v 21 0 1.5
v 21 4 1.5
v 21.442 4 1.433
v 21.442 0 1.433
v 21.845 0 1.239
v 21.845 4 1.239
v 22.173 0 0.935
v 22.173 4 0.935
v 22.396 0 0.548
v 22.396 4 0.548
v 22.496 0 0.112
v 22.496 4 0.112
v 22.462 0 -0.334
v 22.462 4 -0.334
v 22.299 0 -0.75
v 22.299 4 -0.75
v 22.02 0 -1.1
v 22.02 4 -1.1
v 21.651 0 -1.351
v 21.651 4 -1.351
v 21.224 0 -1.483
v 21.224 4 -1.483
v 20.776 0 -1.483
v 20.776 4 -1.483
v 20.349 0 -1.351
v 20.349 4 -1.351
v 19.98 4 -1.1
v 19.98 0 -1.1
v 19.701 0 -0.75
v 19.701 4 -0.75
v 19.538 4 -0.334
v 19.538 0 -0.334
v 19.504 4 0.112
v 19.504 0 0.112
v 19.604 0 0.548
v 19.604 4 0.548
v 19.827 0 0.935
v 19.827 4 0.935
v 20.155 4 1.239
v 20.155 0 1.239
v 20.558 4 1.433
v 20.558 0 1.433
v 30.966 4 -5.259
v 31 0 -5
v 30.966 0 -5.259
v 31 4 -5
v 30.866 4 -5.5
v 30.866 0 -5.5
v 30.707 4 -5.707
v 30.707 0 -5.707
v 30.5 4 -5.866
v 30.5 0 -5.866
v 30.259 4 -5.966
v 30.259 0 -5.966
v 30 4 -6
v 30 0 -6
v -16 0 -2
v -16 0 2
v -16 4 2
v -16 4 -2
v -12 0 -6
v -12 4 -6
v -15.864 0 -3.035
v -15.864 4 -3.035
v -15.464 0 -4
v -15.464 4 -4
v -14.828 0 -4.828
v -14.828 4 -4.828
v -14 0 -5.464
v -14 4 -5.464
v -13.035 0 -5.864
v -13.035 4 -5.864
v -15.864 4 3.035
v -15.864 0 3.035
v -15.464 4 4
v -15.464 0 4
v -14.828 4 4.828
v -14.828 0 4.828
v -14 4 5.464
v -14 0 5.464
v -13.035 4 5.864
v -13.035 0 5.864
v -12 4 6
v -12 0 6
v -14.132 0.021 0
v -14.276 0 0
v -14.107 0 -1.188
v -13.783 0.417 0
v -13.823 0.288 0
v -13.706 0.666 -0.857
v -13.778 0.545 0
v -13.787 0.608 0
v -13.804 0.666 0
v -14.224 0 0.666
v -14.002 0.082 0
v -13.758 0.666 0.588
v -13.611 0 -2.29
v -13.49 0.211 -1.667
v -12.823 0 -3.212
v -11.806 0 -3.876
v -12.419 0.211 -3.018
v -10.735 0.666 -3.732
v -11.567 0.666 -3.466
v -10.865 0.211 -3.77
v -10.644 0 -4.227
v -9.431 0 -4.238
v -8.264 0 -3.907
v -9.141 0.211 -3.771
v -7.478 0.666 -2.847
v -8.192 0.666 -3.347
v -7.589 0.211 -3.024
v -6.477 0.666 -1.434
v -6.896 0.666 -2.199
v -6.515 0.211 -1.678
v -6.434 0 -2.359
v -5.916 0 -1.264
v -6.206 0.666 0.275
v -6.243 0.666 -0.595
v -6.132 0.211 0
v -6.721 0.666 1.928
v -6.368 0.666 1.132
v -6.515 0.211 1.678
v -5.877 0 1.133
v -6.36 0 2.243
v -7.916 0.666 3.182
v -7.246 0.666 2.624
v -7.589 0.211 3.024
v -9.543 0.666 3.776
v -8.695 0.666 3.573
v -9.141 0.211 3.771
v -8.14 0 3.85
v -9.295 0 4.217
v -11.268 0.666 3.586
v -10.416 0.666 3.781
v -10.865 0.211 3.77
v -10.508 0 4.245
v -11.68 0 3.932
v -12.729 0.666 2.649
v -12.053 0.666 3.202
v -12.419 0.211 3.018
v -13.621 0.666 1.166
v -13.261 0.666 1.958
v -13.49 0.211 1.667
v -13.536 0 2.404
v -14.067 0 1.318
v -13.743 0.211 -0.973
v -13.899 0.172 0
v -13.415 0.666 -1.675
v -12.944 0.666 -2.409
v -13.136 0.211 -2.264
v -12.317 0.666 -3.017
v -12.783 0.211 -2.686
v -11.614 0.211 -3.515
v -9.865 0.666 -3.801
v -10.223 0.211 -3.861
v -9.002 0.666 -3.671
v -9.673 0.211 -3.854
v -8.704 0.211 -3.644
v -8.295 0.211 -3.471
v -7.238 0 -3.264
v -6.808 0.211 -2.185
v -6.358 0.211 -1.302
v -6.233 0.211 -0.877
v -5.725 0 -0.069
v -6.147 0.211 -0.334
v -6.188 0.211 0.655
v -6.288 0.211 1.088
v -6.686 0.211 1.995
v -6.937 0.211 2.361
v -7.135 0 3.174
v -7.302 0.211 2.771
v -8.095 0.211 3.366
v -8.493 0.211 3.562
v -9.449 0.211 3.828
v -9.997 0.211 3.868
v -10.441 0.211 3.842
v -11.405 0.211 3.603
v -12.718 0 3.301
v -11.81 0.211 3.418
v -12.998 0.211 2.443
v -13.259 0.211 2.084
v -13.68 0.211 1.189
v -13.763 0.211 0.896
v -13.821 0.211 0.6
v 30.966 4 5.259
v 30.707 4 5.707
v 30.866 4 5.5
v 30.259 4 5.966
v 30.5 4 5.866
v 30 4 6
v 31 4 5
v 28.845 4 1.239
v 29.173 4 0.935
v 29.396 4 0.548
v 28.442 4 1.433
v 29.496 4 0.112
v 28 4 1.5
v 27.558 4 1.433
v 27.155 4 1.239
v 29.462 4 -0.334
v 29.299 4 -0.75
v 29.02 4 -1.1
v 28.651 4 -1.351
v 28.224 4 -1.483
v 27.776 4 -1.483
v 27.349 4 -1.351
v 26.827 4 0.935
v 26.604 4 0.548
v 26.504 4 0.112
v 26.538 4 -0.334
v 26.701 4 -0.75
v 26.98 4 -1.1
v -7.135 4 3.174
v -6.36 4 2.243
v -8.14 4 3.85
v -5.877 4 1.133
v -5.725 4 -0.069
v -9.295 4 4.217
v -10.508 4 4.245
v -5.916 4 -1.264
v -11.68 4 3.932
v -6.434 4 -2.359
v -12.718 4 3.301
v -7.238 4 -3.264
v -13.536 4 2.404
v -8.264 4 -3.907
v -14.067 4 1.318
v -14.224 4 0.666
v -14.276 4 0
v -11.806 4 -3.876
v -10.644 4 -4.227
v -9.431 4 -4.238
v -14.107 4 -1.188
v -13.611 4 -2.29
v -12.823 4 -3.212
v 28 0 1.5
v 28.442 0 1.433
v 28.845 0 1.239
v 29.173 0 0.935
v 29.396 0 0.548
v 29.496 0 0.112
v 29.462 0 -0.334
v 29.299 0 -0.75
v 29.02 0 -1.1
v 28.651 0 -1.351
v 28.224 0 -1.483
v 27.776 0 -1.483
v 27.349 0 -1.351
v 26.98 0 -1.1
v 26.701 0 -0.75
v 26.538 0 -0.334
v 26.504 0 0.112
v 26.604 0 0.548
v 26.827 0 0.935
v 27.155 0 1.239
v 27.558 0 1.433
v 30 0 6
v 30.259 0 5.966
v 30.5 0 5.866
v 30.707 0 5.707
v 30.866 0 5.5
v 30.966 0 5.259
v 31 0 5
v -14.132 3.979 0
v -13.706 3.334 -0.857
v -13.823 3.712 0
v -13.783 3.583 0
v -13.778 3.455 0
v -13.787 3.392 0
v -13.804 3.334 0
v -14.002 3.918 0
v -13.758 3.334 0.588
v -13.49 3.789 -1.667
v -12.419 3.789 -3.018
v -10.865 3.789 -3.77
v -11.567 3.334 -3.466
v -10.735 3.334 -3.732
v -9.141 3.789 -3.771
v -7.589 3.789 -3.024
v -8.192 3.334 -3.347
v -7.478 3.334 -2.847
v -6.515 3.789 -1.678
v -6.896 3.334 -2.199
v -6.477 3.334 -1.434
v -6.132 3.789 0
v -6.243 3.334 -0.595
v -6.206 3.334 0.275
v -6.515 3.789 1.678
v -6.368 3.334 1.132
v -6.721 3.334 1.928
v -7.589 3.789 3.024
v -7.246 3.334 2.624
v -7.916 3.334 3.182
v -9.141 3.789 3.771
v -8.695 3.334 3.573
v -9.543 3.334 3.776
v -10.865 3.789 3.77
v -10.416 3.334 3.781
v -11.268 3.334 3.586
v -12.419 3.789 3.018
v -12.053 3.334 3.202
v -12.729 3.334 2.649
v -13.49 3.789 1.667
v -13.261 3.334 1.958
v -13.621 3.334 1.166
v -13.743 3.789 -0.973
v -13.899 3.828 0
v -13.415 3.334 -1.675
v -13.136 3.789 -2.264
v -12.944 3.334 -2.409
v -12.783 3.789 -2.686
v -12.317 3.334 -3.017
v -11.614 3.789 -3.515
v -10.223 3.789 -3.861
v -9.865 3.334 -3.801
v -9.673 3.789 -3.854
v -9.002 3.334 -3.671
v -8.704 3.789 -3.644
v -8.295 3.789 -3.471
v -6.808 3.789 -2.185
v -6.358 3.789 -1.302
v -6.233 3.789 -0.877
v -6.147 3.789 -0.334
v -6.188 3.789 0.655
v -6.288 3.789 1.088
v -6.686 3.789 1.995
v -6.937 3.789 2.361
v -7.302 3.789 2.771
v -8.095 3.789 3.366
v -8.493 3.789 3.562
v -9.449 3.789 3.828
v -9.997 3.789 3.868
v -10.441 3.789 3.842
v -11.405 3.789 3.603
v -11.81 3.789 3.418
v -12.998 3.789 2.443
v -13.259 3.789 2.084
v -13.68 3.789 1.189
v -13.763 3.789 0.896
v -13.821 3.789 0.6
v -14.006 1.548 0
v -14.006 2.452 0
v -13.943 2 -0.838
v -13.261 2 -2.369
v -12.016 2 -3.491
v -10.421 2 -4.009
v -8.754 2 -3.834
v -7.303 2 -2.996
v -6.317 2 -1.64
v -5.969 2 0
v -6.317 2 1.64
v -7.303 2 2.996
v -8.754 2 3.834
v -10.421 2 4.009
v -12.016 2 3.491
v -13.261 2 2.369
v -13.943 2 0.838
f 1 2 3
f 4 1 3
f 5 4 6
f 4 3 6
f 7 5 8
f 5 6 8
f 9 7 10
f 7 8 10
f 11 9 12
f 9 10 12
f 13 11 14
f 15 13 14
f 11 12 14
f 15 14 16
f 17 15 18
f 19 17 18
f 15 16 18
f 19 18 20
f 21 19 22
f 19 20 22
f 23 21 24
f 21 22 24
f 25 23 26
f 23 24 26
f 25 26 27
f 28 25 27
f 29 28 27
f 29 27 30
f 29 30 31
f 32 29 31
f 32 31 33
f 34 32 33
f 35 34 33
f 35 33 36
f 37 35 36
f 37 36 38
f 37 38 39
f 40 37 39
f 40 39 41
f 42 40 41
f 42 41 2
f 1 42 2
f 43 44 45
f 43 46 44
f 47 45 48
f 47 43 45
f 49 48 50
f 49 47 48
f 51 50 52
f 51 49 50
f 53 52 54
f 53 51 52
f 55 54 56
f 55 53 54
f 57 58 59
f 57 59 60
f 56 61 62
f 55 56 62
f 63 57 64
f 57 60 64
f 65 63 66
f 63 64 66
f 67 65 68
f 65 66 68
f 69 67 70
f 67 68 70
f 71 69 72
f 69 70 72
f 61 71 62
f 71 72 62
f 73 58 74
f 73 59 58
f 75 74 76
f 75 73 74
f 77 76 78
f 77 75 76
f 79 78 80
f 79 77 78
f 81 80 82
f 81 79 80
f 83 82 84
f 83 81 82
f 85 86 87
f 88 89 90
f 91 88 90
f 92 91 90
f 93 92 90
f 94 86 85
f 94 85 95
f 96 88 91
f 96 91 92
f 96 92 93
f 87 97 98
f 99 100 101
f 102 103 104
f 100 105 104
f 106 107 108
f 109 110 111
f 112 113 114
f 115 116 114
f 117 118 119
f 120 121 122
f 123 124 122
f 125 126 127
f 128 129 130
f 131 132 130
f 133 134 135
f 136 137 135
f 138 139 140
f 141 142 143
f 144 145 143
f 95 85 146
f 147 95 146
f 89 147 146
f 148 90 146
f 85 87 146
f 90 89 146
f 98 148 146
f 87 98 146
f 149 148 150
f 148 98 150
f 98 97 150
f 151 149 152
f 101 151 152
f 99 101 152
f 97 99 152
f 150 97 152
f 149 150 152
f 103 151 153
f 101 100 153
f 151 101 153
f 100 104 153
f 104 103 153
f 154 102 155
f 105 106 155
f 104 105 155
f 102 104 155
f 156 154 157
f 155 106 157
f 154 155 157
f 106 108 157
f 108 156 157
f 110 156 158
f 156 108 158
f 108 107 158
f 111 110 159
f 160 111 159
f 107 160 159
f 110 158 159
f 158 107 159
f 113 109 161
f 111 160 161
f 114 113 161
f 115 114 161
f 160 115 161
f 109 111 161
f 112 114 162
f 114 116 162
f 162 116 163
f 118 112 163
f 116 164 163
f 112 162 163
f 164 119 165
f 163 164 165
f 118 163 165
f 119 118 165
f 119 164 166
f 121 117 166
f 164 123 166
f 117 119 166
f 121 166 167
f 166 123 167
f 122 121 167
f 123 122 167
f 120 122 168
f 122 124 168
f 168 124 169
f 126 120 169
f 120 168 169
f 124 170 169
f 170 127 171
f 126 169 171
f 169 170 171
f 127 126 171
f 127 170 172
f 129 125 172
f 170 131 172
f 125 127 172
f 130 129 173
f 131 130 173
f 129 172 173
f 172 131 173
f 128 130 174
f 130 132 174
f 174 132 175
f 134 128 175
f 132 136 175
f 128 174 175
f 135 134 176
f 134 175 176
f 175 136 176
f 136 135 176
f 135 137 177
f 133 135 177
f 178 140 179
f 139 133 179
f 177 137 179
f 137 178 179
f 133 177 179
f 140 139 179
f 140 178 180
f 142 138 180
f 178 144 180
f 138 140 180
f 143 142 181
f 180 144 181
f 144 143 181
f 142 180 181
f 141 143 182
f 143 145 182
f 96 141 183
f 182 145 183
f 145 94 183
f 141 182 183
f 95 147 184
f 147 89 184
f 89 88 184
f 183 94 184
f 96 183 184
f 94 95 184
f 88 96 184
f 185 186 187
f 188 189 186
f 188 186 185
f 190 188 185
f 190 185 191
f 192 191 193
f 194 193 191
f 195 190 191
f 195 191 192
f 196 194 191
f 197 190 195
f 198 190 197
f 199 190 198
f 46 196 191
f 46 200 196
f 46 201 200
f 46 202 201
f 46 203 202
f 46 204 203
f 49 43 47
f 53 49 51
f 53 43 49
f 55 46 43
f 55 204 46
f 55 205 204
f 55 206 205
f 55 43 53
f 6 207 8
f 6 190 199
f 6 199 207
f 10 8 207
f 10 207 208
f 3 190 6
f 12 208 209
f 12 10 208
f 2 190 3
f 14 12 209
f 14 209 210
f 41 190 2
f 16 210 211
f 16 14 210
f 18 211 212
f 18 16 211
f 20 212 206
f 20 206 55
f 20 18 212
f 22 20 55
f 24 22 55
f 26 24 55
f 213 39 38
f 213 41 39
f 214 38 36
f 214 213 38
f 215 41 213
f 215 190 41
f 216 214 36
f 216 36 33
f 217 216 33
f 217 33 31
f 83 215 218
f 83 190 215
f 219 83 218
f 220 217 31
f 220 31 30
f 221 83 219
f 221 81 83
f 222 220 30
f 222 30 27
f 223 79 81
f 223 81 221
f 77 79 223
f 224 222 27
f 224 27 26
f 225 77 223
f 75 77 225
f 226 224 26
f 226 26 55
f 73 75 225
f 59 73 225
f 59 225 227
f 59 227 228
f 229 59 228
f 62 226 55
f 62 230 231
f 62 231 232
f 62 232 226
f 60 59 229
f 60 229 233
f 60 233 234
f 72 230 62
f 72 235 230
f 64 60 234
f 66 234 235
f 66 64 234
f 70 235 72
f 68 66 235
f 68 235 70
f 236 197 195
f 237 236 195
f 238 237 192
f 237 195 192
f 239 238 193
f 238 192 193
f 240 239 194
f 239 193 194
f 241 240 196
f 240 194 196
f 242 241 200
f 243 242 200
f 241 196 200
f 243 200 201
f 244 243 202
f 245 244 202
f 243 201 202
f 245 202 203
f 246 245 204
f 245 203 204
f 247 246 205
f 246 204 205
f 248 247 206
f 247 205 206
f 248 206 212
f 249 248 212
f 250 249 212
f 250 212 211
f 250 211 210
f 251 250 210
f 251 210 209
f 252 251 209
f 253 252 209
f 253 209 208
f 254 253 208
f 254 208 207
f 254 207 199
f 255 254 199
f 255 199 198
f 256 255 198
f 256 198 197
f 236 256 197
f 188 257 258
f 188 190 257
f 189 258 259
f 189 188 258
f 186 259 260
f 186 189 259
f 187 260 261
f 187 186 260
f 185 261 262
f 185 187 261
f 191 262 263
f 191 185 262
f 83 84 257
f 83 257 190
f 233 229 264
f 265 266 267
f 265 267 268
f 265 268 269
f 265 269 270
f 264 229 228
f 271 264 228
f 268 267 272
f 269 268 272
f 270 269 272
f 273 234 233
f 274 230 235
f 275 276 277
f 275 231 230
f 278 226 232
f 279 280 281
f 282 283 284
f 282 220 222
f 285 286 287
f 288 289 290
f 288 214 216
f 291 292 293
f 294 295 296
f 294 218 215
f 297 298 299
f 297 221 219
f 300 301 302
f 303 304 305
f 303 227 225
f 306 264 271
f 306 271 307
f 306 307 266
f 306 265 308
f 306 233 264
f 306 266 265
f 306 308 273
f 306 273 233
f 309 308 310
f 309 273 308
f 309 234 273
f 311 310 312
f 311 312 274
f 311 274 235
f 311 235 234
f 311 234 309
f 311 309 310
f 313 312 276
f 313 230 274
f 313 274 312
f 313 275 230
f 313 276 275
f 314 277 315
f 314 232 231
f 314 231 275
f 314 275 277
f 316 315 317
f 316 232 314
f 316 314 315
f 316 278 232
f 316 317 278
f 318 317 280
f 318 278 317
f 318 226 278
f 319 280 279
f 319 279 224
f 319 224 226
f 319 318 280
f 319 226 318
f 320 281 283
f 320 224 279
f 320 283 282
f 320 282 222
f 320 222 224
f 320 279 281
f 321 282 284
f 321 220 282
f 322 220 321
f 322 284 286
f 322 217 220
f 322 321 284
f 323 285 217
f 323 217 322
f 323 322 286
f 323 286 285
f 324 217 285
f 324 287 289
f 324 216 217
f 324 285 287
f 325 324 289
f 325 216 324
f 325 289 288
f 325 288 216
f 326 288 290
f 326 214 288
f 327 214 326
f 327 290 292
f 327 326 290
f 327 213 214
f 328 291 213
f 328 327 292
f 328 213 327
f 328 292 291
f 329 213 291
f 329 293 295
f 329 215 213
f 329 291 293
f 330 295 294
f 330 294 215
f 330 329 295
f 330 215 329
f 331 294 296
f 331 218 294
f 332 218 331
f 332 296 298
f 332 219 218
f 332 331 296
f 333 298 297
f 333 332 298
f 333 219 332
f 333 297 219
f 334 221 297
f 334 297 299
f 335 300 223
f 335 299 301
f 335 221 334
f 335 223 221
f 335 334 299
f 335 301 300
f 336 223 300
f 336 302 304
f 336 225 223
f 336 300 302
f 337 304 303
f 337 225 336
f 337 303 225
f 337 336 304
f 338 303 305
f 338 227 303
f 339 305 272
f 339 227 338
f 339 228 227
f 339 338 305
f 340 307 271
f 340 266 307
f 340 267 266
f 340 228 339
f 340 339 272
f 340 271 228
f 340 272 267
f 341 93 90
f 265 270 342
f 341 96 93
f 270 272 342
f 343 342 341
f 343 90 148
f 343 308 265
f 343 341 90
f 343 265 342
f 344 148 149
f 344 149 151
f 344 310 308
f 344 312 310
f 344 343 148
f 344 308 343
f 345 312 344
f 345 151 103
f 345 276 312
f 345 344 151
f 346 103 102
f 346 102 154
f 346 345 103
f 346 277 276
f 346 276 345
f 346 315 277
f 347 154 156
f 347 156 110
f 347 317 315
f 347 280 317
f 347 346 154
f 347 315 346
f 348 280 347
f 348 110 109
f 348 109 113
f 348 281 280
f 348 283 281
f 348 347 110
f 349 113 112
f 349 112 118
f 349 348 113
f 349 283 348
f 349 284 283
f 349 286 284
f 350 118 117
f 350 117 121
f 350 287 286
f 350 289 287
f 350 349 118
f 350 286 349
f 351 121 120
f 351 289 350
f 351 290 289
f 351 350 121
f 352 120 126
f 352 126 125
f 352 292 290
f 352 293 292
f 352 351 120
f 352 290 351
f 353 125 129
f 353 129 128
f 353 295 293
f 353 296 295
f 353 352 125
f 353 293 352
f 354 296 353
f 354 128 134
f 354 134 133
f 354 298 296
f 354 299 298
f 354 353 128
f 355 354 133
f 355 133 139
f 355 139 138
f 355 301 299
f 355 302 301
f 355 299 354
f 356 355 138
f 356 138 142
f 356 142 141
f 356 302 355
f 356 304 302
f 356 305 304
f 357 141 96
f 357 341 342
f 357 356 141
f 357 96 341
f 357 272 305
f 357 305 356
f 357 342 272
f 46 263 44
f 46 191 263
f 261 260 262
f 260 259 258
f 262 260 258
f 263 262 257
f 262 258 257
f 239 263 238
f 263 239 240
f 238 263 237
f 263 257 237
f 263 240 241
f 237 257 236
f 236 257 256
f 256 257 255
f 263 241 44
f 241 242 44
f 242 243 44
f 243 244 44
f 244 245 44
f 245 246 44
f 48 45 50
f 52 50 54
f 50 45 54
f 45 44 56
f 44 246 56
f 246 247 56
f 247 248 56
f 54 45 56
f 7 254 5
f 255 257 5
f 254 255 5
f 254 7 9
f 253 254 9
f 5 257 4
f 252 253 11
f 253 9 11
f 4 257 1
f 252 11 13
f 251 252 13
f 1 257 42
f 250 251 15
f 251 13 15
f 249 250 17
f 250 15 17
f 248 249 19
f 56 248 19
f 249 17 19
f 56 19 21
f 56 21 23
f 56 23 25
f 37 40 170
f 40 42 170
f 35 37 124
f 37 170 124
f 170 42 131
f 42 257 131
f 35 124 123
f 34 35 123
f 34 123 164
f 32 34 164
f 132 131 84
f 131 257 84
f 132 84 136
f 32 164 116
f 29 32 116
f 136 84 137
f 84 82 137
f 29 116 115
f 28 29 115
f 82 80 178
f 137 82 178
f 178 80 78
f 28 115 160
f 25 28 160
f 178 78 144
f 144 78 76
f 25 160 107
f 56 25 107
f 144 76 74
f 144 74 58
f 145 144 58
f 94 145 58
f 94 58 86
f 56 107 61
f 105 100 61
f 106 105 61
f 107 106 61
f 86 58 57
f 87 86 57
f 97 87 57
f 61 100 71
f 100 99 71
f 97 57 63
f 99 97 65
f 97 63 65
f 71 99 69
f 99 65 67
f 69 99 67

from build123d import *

# Parameters (mm, degrees)
SKETCH1_W           = 32
SKETCH1_H           = 12
BOSS_EXTRUDE1_DEPTH = 4
FILLET1_R           = 4
FILLET2_R           = 0.5
SKETCH3_W           = 12
SKETCH3_H           = 4
BOSS_EXTRUDE2_DEPTH = 15
SKETCH5_R           = 1.5
CUT_EXTRUDE1_DEPTH  = 32.827661054
FILLET4_R           = 1


with BuildPart() as part:
    # Sketch1 → Boss-Extrude1 (new body)
    with BuildSketch(Plane(origin=(0, 0, 0), x_dir=(1, 0, 0), z_dir=(0, 1, 0))):
        Rectangle(SKETCH1_W, SKETCH1_H)
    extrude(amount=BOSS_EXTRUDE1_DEPTH)

    # Sketch2 → Cut-Revolve1 (revolve, cut)
    with BuildSketch(Plane.XY):
        with BuildLine():
            Line((-10, 4), (-10, 0))
            Line((-10, 0), (-13.5, 0))
            ThreePointArc((-13.5, 0), (-14.031128874, 2), (-13.5, 4))
            Line((-13.5, 4), (-10, 4))
        make_face()
    revolve(axis=Axis((-10, 4, 0), (0, -1, 0)), mode=Mode.SUBTRACT)

    # Fillet1
    fillet1_edges = [part.edges().sort_by_distance(p)[0] for p in [
        (-16, 2, -6),
        (-16, 2, 6),
    ]]
    fillet(fillet1_edges, radius=FILLET1_R)

    # Fillet2
    fillet2_edges = [part.edges().sort_by_distance(p)[0] for p in [
        (-6.5, 4, 0),
        (-6.5, 0, 0),
    ]]
    fillet(fillet2_edges, radius=FILLET2_R)

    # Sketch3 → Boss-Extrude2 (add)
    with BuildSketch(Plane(origin=(16, 0, 0), x_dir=(0, 0, -1), z_dir=(1, 0, 0))):
        with Locations((0, 2)):
            Rectangle(SKETCH3_W, SKETCH3_H)
    extrude(amount=BOSS_EXTRUDE2_DEPTH)

    # Sketch5 → Cut-Extrude1 (cut, through all)
    with BuildSketch(Plane(origin=(0, 4, 0), x_dir=(1, 0, 0), z_dir=(0, 1, 0))):
        with Locations(Location((21, 0, 0), (0, 0, 270))):
            Circle(SKETCH5_R)
        with Locations(Location((28, 0, 0), (0, 0, 270))):
            Circle(SKETCH5_R)
    extrude(amount=-CUT_EXTRUDE1_DEPTH, mode=Mode.SUBTRACT)

    # Fillet4
    fillet4_edges = [part.edges().sort_by_distance(p)[0] for p in [
        (31, 2, 6),
        (31, 2, -6),
    ]]
    fillet(fillet4_edges, radius=FILLET4_R)


solid = part.part
